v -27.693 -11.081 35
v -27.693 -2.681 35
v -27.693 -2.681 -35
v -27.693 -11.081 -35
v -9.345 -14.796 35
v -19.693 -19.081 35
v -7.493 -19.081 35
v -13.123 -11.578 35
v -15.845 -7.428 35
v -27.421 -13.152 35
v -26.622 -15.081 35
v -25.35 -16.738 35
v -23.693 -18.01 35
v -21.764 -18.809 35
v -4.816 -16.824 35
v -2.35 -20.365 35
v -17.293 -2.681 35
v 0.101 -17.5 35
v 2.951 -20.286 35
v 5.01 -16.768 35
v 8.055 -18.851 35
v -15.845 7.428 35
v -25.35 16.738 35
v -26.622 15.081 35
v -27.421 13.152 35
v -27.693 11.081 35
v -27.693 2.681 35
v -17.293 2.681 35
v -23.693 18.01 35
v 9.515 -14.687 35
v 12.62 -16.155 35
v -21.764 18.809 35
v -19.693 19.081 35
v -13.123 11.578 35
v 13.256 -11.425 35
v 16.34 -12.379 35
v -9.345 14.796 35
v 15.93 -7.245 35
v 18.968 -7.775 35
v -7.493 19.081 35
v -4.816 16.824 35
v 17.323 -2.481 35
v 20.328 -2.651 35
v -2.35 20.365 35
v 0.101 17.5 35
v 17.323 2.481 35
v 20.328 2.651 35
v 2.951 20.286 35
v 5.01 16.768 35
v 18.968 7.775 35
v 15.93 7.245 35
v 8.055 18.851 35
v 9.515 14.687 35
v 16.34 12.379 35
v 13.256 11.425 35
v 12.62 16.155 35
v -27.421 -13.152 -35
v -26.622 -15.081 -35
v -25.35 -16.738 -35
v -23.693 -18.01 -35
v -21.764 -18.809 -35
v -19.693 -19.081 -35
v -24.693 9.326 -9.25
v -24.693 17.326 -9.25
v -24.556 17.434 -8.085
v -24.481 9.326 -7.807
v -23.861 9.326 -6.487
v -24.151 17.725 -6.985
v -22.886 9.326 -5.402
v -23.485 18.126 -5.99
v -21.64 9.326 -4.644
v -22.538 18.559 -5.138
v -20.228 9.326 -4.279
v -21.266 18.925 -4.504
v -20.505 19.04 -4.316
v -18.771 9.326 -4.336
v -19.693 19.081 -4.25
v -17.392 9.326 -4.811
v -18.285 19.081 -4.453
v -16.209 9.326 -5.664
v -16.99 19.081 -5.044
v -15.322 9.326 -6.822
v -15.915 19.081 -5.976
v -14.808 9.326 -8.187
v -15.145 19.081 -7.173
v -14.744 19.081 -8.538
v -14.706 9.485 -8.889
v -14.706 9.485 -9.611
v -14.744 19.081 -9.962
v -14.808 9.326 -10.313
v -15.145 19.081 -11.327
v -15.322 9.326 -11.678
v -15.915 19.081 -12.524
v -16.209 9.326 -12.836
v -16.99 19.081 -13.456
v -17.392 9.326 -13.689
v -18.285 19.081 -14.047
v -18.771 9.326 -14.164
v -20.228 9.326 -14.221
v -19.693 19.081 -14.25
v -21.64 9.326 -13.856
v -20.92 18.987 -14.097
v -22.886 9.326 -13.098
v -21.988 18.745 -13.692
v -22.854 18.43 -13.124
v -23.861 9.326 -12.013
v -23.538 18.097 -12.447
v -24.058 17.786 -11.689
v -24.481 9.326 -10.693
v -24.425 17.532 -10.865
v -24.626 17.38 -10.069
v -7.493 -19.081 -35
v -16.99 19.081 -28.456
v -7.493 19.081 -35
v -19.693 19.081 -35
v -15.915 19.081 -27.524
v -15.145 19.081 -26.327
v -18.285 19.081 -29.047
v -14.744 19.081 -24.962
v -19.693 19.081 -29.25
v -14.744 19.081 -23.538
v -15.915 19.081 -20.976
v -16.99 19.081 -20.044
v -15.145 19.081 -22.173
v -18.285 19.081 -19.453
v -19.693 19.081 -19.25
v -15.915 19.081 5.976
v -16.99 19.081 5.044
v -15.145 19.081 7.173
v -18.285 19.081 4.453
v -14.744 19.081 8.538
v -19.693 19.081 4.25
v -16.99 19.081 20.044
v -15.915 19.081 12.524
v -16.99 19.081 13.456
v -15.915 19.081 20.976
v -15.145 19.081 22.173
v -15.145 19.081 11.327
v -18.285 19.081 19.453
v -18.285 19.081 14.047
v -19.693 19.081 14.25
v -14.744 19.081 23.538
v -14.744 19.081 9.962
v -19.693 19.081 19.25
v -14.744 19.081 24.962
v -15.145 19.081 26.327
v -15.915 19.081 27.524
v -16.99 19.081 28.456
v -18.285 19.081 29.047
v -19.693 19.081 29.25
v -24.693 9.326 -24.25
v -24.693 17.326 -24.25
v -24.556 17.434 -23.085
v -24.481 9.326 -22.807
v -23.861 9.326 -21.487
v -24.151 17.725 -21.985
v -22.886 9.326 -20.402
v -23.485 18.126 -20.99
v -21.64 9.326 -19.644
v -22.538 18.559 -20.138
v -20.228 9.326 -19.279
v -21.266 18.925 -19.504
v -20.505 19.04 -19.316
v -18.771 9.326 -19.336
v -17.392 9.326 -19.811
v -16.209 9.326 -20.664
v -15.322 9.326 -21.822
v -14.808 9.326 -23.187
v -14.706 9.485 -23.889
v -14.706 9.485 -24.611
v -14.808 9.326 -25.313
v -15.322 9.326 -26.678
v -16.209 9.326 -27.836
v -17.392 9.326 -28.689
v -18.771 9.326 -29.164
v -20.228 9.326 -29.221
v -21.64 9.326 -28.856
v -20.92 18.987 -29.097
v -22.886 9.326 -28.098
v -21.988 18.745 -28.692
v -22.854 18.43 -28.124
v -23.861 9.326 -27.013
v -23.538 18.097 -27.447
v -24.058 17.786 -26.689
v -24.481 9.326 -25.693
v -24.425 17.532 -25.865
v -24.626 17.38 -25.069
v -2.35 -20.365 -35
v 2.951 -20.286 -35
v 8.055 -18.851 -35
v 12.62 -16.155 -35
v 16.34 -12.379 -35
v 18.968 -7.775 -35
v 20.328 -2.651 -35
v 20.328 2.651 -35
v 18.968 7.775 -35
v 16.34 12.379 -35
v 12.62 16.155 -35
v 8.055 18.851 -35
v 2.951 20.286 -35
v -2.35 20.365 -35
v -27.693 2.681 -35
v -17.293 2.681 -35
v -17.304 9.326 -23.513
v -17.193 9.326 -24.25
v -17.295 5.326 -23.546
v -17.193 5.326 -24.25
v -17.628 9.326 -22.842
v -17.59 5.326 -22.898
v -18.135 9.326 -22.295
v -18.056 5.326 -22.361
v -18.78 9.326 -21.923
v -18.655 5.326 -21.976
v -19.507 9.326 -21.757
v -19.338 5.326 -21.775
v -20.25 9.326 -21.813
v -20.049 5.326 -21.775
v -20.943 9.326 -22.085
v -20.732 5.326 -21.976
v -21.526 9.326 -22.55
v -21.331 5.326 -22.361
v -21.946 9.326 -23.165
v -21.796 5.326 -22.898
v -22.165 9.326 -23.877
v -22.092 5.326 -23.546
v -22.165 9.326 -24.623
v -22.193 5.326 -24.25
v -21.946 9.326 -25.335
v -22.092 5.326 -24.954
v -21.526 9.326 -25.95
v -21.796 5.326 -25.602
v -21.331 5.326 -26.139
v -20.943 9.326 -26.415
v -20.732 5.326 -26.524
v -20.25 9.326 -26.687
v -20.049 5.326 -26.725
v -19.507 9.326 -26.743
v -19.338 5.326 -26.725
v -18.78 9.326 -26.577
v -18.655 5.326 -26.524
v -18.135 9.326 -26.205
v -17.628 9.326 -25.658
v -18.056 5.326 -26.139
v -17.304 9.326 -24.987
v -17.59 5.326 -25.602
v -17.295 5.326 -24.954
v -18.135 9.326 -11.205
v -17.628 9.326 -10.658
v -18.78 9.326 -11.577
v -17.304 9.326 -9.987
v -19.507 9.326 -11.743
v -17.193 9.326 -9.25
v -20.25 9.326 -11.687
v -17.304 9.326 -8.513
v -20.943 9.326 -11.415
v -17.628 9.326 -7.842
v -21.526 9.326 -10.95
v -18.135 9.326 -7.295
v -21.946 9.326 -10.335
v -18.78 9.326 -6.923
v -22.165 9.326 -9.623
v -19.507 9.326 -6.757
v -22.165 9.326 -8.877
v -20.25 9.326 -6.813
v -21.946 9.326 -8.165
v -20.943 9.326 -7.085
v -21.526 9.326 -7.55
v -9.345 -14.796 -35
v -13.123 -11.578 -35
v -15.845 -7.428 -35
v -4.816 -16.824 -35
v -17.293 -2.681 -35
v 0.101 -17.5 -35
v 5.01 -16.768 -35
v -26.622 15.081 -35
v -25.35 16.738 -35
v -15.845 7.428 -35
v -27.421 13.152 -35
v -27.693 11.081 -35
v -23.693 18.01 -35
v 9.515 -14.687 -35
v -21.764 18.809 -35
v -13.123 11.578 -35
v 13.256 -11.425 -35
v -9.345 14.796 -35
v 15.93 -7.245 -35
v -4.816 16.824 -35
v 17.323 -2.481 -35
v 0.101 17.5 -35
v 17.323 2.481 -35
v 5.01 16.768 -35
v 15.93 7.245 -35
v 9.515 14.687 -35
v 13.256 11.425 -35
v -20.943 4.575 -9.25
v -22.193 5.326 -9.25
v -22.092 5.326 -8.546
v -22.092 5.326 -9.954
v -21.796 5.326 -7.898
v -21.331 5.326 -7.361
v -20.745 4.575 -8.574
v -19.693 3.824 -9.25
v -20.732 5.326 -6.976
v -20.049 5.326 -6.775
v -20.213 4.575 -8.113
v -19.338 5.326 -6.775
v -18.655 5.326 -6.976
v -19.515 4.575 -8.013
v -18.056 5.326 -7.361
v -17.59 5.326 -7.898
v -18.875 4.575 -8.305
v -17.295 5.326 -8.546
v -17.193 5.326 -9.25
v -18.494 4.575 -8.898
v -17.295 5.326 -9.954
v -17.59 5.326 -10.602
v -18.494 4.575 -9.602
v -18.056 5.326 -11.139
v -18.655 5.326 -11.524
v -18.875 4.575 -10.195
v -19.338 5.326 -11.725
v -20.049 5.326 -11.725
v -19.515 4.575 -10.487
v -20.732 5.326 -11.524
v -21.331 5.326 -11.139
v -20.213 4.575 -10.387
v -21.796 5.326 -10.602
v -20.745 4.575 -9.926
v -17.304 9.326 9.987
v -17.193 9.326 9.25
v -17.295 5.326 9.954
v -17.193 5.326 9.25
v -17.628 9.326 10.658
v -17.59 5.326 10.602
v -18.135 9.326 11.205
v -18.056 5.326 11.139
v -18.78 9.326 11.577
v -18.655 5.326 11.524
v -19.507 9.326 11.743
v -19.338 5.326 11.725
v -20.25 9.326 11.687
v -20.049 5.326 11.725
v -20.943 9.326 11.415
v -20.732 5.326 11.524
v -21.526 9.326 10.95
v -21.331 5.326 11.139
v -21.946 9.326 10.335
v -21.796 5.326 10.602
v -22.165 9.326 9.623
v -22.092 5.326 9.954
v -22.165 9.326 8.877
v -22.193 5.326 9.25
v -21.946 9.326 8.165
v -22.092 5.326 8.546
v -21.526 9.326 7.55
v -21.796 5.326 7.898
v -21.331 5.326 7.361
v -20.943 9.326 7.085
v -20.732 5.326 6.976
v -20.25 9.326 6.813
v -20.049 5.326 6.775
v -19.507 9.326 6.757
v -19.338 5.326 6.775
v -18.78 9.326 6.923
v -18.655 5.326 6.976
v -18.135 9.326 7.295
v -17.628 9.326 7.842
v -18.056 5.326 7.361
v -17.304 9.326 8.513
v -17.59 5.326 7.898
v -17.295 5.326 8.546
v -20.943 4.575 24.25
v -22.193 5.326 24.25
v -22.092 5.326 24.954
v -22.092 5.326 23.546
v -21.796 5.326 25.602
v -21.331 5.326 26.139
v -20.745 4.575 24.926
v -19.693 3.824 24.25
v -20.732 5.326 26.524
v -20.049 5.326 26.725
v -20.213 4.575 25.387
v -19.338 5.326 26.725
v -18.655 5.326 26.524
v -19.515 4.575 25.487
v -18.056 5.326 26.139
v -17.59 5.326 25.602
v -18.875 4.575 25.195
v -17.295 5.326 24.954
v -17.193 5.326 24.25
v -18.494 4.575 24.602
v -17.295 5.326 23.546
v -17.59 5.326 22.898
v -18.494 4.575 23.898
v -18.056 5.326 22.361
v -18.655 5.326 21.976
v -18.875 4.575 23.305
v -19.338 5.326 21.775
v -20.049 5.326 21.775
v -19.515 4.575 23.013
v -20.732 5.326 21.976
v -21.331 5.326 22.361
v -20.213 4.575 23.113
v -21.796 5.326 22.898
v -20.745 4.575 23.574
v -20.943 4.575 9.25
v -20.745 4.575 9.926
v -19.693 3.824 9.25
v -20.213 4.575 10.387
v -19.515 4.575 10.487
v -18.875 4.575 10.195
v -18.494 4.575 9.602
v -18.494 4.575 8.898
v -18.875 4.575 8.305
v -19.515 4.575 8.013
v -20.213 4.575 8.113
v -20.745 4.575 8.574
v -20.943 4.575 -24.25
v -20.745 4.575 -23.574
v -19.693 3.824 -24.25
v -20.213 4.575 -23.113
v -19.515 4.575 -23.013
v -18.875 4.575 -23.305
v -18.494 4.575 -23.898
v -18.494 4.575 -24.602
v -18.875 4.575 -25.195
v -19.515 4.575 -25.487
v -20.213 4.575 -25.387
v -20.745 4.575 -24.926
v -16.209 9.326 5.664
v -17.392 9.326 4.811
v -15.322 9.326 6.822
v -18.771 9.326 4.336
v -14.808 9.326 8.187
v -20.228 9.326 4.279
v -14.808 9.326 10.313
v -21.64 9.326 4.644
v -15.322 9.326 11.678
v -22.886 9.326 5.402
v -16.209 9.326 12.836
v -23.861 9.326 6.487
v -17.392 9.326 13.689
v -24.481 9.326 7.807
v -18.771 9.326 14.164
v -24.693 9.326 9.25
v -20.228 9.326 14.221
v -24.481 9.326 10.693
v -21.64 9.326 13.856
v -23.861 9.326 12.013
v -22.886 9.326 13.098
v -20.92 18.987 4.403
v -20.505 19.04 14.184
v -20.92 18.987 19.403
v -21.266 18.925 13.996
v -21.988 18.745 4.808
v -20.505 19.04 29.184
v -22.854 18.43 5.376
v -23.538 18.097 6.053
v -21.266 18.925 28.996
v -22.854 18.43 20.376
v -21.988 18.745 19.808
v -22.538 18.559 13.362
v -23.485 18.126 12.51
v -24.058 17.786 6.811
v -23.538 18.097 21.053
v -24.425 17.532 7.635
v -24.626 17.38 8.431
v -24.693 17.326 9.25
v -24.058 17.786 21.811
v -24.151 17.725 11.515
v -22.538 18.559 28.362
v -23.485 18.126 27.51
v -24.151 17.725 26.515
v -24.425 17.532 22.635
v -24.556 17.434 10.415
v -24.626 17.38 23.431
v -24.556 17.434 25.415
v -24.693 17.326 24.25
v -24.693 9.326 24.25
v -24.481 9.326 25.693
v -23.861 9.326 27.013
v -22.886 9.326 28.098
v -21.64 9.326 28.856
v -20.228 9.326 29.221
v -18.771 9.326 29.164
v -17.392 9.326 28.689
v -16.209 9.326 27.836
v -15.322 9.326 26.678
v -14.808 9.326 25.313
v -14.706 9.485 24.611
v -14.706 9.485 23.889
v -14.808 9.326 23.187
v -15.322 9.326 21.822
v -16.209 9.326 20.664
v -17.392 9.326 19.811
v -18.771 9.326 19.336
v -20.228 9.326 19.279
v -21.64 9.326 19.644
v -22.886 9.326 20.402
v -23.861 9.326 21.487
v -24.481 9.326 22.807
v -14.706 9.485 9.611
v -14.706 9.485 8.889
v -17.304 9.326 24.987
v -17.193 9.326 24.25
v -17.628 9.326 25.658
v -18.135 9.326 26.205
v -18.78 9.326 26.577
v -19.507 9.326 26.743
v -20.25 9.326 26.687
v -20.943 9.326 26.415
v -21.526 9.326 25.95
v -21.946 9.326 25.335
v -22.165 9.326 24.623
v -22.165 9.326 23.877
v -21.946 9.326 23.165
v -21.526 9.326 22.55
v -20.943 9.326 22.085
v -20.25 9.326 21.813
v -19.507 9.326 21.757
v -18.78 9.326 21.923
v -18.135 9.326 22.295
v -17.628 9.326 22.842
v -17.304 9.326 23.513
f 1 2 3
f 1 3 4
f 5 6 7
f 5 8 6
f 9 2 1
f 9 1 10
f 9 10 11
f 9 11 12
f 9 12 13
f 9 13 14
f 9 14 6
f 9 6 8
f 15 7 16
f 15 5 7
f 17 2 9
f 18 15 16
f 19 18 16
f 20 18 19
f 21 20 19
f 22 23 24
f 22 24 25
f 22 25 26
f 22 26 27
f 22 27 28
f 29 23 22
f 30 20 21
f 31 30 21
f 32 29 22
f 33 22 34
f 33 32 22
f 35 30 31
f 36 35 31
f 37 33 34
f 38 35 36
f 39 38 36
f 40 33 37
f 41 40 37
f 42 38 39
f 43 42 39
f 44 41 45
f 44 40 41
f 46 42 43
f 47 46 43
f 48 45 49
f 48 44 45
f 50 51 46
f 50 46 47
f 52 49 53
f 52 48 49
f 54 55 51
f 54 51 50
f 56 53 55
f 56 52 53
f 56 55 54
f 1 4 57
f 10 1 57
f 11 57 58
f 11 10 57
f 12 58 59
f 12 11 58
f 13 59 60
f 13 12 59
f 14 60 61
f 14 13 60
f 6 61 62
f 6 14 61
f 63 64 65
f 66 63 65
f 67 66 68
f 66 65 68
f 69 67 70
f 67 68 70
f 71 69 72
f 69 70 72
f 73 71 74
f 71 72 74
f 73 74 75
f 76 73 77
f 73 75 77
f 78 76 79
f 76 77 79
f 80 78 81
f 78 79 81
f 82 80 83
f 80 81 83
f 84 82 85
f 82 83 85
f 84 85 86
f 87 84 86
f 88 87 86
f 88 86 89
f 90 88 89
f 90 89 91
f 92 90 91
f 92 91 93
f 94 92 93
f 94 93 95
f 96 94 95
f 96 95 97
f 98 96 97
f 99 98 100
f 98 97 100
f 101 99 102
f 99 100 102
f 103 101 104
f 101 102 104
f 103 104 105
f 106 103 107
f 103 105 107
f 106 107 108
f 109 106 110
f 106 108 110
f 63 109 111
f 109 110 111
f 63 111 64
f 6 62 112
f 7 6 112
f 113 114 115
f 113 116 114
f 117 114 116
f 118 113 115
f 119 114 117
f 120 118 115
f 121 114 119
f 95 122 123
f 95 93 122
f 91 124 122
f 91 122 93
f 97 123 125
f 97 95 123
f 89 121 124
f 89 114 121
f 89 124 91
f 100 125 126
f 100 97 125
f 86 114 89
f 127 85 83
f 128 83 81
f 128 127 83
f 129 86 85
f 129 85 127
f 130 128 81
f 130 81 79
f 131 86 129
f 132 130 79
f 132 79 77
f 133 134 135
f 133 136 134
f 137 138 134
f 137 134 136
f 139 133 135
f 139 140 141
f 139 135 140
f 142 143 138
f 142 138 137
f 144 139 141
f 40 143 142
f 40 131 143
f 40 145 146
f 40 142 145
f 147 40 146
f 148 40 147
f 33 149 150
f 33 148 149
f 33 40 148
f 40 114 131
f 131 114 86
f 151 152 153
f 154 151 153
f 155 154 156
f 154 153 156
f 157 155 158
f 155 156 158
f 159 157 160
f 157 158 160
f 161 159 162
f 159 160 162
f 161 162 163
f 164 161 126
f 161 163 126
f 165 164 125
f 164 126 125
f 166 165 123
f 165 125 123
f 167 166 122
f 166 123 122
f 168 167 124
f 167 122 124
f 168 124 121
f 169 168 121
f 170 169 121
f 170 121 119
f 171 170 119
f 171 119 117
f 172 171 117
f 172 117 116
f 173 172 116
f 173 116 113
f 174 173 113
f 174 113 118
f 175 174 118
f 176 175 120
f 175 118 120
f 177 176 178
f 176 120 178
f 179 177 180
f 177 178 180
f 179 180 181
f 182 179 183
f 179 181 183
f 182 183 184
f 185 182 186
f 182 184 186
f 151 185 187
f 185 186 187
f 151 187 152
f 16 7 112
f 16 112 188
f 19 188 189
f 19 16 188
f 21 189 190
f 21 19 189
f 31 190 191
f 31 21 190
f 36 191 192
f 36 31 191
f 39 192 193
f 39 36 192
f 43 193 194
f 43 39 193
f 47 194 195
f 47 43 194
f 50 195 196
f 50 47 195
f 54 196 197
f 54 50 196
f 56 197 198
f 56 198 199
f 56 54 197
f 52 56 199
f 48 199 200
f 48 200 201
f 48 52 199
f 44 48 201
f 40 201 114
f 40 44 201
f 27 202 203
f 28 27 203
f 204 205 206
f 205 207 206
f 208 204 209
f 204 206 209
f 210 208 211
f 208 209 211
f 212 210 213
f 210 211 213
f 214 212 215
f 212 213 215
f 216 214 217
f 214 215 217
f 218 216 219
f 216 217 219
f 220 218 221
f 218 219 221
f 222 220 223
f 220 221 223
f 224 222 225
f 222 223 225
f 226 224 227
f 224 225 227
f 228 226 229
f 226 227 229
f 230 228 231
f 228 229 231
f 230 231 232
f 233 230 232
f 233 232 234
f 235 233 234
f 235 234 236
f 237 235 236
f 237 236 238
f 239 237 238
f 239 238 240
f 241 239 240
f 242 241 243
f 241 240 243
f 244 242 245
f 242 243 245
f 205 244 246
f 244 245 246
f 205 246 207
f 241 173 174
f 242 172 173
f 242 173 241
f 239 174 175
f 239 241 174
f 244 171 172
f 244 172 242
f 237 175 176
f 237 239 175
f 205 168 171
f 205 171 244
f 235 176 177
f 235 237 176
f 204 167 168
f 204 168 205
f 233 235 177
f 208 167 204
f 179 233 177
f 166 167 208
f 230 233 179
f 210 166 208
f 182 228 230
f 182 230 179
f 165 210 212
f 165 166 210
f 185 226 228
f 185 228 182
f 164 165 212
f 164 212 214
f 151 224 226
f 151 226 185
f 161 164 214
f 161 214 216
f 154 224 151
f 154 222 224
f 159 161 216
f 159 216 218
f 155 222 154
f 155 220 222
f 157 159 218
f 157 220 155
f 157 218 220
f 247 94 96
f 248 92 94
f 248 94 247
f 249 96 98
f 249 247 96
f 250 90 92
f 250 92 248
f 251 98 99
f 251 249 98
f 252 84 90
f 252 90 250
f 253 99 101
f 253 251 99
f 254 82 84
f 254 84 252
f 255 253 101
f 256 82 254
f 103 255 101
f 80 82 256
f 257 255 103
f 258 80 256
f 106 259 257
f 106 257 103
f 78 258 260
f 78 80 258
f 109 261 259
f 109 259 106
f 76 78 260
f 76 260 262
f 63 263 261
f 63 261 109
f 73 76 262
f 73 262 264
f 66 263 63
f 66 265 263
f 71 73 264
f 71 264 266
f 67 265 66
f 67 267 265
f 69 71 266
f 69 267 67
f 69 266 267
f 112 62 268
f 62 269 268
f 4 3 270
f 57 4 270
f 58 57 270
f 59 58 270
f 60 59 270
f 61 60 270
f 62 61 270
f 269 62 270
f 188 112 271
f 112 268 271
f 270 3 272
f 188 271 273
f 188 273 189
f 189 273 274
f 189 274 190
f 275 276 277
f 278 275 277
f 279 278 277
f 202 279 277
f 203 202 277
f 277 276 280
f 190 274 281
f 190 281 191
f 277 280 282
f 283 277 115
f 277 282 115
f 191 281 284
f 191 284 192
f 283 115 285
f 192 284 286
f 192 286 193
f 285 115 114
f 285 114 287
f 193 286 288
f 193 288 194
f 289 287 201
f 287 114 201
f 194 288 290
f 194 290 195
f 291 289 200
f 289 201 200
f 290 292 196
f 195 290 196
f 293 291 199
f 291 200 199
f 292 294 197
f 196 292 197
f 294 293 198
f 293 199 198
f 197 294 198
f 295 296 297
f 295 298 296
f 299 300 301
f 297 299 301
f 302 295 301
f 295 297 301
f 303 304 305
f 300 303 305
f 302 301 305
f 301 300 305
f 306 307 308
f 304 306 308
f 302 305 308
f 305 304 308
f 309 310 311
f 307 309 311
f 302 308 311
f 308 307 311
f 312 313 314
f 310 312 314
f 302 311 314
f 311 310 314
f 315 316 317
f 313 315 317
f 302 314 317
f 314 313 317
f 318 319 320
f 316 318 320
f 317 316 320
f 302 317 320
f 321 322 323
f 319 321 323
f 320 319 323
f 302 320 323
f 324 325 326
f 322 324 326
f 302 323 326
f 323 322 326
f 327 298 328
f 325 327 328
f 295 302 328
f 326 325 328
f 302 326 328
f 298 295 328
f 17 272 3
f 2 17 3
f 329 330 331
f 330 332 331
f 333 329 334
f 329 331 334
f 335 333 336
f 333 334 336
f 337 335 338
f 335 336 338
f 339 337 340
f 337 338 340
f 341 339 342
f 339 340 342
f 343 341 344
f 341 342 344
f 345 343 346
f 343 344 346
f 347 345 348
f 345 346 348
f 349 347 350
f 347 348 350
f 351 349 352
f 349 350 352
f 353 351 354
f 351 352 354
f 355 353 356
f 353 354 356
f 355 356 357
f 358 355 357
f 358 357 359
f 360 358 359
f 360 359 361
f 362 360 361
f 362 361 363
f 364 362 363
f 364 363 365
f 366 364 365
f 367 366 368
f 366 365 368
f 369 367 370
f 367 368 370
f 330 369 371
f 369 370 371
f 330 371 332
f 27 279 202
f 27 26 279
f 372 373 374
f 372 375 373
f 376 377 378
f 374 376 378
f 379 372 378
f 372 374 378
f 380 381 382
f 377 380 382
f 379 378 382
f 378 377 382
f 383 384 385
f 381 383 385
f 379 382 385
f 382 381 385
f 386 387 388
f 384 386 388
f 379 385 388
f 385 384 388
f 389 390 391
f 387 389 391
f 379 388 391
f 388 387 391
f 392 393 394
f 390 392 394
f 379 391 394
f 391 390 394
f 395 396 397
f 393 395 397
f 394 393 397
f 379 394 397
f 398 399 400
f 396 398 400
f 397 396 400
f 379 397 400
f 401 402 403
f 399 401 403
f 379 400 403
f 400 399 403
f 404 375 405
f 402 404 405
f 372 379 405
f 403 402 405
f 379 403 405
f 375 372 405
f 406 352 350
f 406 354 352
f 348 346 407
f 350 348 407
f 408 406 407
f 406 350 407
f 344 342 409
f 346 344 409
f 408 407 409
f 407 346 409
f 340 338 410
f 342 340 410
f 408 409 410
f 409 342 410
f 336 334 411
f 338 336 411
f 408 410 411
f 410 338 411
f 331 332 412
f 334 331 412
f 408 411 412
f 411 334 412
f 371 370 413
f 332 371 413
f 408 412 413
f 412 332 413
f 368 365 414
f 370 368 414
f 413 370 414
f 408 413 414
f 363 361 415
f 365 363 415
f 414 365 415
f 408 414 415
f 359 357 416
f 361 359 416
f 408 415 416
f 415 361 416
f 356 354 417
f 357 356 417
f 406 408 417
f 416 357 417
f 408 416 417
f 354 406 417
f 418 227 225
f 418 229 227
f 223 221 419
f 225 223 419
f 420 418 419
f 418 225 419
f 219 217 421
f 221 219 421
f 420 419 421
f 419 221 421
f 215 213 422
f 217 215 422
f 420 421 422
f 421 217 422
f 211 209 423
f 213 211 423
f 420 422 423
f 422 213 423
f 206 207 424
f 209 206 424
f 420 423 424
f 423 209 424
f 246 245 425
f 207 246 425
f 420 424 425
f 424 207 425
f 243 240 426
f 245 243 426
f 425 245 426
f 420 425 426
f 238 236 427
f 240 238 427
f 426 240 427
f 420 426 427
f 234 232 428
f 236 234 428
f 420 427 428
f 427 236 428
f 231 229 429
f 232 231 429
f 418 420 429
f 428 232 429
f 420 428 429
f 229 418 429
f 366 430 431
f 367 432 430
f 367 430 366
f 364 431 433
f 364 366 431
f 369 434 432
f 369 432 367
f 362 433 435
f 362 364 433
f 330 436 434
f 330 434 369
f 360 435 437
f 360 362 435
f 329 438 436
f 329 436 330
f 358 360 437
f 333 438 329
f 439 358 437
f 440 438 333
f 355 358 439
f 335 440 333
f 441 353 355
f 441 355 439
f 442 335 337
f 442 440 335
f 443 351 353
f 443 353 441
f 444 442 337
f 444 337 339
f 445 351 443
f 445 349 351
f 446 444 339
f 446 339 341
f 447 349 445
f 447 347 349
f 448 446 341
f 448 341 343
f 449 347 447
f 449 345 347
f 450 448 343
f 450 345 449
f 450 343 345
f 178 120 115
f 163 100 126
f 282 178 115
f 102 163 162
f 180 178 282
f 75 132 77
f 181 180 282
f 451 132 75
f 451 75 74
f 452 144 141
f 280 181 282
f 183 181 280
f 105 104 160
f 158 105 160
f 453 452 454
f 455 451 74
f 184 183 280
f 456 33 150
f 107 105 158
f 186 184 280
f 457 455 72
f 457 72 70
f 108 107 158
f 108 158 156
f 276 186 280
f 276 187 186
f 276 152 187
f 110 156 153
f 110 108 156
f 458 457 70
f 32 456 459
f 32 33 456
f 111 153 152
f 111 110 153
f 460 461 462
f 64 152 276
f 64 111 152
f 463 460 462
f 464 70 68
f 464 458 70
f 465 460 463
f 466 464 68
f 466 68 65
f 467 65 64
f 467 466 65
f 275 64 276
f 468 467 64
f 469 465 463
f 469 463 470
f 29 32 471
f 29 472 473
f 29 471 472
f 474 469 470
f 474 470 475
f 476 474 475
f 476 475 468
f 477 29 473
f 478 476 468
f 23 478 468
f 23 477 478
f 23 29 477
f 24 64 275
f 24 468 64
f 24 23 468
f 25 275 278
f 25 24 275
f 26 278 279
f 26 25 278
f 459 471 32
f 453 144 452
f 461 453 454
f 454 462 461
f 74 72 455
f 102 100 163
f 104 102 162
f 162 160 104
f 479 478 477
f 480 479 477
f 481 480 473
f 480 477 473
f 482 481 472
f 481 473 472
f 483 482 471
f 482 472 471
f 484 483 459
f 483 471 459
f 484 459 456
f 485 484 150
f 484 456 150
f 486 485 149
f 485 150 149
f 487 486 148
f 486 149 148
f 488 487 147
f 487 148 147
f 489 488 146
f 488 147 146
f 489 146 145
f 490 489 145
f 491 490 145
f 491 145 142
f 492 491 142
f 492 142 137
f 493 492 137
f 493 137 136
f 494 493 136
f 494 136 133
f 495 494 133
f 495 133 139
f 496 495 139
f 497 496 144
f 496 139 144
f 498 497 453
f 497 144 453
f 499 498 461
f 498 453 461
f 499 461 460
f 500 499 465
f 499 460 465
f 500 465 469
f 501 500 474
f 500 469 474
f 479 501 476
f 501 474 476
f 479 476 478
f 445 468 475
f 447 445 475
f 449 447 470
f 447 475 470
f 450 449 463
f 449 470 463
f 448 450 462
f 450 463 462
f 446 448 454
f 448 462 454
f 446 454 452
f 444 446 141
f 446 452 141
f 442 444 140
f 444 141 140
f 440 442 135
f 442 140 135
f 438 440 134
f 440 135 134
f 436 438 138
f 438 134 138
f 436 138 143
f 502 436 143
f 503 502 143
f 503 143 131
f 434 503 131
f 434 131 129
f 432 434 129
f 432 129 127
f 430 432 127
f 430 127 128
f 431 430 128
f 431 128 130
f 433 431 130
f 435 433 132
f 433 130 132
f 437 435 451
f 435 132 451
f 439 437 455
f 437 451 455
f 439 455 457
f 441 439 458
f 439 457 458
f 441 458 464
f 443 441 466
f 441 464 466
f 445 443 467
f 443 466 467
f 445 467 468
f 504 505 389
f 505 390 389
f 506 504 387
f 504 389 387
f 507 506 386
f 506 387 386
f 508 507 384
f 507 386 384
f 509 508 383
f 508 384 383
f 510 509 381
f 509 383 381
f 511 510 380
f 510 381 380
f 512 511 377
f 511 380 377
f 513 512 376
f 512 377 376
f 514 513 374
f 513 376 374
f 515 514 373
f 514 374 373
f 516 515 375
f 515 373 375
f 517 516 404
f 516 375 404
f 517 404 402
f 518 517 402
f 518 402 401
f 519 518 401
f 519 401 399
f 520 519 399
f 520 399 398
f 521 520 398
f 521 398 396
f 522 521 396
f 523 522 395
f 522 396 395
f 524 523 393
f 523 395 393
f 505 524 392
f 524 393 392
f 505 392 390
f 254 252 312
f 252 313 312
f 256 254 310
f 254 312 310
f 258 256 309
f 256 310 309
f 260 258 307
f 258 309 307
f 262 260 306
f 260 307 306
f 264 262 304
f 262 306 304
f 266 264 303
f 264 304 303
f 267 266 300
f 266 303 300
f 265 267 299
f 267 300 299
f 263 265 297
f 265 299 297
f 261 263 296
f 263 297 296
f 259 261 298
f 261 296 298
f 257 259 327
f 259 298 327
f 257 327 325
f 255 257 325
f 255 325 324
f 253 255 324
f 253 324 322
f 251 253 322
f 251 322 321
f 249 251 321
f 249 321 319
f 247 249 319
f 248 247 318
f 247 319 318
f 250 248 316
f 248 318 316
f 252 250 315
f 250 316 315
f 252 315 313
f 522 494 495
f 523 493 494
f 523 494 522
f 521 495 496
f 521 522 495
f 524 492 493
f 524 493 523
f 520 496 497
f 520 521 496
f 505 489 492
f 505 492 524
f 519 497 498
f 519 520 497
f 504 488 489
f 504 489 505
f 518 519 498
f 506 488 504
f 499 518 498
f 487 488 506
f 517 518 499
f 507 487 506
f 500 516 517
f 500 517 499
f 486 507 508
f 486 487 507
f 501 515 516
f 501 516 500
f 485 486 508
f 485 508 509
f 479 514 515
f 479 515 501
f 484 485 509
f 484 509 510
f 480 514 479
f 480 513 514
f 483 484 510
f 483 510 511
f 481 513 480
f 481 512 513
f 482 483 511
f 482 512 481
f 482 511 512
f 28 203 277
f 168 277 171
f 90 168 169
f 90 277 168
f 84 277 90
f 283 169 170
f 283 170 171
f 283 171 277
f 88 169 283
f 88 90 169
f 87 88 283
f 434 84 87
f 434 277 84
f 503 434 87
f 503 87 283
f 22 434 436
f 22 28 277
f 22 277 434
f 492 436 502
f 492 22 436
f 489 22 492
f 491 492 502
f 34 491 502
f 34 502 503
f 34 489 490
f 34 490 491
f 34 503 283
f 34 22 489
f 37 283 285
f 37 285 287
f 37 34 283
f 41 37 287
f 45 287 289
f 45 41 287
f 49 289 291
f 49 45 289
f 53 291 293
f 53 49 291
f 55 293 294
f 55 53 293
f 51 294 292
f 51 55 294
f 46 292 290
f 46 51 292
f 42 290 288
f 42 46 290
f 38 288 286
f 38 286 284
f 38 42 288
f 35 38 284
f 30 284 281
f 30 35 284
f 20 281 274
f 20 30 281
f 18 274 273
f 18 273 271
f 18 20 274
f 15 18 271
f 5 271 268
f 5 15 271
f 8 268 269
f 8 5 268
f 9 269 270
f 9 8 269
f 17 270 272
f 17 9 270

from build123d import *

# Parameters (mm, degrees)
F1_DEPTH       = 35
F3_D           = 5
F3_DEPTH       = 12
F3_START       = 1.7550021
F3_CBORE_D     = 10
F3_CBORE_DEPTH = 8
F3_TIP         = 1.5021515476


with BuildPart() as f1:
    # F0 (on Top) → F1 (new body, symmetric)
    with BuildSketch(Plane.XY):
        with BuildLine():
            ThreePointArc((-17.2933548246, 2.6813949562), (17.5, 0), (-17.2933548246, -2.6813949562))
            Line((-17.2933548246, -2.6813949562), (-27.6933548246, -2.6813949562))
            Line((-27.6933548246, -2.6813949562), (-27.6933548246, -11.0813949562))
            ThreePointArc((-27.6933548246, -11.0813949562), (-25.3502090741, -16.7382492056), (-19.6933548246, -19.0813949562))
            Line((-19.6933548246, -19.0813949562), (-7.4933548246, -19.0813949562))
            ThreePointArc((-7.4933548246, -19.0813949562), (20.5, 0), (-7.4933548246, 19.0813949562))
            Line((-7.4933548246, 19.0813949562), (-19.6933548246, 19.0813949562))
            ThreePointArc((-19.6933548246, 19.0813949562), (-25.3502090741, 16.7382492056), (-27.6933548246, 11.0813949562))
            Line((-27.6933548246, 11.0813949562), (-27.6933548246, 2.6813949562))
            Line((-27.6933548246, 2.6813949562), (-17.2933548246, 2.6813949562))
        make_face()
    extrude(amount=F1_DEPTH, both=True)

    # F3
    # its depths count from where the whole tool has entered the part; down to there all is cleared
    with Locations(Plane(origin=(0, 19.0813949562, 0), x_dir=(-1, 0, 0), z_dir=(0, 1, 0)).offset(-F3_START)):
        with Locations((19.6933548246, 24.25), (19.6933548246, 9.25), (19.6933548246, -9.25), (19.6933548246, -24.25)):
            CounterBoreHole(F3_D / 2, F3_CBORE_D / 2, F3_CBORE_DEPTH, depth=F3_DEPTH)
            with Locations((0, 0, -(F3_DEPTH + F3_TIP / 2))):  # 118° drill point
                Cone(0, F3_D / 2, F3_TIP, mode=Mode.SUBTRACT)


solid = f1.part
